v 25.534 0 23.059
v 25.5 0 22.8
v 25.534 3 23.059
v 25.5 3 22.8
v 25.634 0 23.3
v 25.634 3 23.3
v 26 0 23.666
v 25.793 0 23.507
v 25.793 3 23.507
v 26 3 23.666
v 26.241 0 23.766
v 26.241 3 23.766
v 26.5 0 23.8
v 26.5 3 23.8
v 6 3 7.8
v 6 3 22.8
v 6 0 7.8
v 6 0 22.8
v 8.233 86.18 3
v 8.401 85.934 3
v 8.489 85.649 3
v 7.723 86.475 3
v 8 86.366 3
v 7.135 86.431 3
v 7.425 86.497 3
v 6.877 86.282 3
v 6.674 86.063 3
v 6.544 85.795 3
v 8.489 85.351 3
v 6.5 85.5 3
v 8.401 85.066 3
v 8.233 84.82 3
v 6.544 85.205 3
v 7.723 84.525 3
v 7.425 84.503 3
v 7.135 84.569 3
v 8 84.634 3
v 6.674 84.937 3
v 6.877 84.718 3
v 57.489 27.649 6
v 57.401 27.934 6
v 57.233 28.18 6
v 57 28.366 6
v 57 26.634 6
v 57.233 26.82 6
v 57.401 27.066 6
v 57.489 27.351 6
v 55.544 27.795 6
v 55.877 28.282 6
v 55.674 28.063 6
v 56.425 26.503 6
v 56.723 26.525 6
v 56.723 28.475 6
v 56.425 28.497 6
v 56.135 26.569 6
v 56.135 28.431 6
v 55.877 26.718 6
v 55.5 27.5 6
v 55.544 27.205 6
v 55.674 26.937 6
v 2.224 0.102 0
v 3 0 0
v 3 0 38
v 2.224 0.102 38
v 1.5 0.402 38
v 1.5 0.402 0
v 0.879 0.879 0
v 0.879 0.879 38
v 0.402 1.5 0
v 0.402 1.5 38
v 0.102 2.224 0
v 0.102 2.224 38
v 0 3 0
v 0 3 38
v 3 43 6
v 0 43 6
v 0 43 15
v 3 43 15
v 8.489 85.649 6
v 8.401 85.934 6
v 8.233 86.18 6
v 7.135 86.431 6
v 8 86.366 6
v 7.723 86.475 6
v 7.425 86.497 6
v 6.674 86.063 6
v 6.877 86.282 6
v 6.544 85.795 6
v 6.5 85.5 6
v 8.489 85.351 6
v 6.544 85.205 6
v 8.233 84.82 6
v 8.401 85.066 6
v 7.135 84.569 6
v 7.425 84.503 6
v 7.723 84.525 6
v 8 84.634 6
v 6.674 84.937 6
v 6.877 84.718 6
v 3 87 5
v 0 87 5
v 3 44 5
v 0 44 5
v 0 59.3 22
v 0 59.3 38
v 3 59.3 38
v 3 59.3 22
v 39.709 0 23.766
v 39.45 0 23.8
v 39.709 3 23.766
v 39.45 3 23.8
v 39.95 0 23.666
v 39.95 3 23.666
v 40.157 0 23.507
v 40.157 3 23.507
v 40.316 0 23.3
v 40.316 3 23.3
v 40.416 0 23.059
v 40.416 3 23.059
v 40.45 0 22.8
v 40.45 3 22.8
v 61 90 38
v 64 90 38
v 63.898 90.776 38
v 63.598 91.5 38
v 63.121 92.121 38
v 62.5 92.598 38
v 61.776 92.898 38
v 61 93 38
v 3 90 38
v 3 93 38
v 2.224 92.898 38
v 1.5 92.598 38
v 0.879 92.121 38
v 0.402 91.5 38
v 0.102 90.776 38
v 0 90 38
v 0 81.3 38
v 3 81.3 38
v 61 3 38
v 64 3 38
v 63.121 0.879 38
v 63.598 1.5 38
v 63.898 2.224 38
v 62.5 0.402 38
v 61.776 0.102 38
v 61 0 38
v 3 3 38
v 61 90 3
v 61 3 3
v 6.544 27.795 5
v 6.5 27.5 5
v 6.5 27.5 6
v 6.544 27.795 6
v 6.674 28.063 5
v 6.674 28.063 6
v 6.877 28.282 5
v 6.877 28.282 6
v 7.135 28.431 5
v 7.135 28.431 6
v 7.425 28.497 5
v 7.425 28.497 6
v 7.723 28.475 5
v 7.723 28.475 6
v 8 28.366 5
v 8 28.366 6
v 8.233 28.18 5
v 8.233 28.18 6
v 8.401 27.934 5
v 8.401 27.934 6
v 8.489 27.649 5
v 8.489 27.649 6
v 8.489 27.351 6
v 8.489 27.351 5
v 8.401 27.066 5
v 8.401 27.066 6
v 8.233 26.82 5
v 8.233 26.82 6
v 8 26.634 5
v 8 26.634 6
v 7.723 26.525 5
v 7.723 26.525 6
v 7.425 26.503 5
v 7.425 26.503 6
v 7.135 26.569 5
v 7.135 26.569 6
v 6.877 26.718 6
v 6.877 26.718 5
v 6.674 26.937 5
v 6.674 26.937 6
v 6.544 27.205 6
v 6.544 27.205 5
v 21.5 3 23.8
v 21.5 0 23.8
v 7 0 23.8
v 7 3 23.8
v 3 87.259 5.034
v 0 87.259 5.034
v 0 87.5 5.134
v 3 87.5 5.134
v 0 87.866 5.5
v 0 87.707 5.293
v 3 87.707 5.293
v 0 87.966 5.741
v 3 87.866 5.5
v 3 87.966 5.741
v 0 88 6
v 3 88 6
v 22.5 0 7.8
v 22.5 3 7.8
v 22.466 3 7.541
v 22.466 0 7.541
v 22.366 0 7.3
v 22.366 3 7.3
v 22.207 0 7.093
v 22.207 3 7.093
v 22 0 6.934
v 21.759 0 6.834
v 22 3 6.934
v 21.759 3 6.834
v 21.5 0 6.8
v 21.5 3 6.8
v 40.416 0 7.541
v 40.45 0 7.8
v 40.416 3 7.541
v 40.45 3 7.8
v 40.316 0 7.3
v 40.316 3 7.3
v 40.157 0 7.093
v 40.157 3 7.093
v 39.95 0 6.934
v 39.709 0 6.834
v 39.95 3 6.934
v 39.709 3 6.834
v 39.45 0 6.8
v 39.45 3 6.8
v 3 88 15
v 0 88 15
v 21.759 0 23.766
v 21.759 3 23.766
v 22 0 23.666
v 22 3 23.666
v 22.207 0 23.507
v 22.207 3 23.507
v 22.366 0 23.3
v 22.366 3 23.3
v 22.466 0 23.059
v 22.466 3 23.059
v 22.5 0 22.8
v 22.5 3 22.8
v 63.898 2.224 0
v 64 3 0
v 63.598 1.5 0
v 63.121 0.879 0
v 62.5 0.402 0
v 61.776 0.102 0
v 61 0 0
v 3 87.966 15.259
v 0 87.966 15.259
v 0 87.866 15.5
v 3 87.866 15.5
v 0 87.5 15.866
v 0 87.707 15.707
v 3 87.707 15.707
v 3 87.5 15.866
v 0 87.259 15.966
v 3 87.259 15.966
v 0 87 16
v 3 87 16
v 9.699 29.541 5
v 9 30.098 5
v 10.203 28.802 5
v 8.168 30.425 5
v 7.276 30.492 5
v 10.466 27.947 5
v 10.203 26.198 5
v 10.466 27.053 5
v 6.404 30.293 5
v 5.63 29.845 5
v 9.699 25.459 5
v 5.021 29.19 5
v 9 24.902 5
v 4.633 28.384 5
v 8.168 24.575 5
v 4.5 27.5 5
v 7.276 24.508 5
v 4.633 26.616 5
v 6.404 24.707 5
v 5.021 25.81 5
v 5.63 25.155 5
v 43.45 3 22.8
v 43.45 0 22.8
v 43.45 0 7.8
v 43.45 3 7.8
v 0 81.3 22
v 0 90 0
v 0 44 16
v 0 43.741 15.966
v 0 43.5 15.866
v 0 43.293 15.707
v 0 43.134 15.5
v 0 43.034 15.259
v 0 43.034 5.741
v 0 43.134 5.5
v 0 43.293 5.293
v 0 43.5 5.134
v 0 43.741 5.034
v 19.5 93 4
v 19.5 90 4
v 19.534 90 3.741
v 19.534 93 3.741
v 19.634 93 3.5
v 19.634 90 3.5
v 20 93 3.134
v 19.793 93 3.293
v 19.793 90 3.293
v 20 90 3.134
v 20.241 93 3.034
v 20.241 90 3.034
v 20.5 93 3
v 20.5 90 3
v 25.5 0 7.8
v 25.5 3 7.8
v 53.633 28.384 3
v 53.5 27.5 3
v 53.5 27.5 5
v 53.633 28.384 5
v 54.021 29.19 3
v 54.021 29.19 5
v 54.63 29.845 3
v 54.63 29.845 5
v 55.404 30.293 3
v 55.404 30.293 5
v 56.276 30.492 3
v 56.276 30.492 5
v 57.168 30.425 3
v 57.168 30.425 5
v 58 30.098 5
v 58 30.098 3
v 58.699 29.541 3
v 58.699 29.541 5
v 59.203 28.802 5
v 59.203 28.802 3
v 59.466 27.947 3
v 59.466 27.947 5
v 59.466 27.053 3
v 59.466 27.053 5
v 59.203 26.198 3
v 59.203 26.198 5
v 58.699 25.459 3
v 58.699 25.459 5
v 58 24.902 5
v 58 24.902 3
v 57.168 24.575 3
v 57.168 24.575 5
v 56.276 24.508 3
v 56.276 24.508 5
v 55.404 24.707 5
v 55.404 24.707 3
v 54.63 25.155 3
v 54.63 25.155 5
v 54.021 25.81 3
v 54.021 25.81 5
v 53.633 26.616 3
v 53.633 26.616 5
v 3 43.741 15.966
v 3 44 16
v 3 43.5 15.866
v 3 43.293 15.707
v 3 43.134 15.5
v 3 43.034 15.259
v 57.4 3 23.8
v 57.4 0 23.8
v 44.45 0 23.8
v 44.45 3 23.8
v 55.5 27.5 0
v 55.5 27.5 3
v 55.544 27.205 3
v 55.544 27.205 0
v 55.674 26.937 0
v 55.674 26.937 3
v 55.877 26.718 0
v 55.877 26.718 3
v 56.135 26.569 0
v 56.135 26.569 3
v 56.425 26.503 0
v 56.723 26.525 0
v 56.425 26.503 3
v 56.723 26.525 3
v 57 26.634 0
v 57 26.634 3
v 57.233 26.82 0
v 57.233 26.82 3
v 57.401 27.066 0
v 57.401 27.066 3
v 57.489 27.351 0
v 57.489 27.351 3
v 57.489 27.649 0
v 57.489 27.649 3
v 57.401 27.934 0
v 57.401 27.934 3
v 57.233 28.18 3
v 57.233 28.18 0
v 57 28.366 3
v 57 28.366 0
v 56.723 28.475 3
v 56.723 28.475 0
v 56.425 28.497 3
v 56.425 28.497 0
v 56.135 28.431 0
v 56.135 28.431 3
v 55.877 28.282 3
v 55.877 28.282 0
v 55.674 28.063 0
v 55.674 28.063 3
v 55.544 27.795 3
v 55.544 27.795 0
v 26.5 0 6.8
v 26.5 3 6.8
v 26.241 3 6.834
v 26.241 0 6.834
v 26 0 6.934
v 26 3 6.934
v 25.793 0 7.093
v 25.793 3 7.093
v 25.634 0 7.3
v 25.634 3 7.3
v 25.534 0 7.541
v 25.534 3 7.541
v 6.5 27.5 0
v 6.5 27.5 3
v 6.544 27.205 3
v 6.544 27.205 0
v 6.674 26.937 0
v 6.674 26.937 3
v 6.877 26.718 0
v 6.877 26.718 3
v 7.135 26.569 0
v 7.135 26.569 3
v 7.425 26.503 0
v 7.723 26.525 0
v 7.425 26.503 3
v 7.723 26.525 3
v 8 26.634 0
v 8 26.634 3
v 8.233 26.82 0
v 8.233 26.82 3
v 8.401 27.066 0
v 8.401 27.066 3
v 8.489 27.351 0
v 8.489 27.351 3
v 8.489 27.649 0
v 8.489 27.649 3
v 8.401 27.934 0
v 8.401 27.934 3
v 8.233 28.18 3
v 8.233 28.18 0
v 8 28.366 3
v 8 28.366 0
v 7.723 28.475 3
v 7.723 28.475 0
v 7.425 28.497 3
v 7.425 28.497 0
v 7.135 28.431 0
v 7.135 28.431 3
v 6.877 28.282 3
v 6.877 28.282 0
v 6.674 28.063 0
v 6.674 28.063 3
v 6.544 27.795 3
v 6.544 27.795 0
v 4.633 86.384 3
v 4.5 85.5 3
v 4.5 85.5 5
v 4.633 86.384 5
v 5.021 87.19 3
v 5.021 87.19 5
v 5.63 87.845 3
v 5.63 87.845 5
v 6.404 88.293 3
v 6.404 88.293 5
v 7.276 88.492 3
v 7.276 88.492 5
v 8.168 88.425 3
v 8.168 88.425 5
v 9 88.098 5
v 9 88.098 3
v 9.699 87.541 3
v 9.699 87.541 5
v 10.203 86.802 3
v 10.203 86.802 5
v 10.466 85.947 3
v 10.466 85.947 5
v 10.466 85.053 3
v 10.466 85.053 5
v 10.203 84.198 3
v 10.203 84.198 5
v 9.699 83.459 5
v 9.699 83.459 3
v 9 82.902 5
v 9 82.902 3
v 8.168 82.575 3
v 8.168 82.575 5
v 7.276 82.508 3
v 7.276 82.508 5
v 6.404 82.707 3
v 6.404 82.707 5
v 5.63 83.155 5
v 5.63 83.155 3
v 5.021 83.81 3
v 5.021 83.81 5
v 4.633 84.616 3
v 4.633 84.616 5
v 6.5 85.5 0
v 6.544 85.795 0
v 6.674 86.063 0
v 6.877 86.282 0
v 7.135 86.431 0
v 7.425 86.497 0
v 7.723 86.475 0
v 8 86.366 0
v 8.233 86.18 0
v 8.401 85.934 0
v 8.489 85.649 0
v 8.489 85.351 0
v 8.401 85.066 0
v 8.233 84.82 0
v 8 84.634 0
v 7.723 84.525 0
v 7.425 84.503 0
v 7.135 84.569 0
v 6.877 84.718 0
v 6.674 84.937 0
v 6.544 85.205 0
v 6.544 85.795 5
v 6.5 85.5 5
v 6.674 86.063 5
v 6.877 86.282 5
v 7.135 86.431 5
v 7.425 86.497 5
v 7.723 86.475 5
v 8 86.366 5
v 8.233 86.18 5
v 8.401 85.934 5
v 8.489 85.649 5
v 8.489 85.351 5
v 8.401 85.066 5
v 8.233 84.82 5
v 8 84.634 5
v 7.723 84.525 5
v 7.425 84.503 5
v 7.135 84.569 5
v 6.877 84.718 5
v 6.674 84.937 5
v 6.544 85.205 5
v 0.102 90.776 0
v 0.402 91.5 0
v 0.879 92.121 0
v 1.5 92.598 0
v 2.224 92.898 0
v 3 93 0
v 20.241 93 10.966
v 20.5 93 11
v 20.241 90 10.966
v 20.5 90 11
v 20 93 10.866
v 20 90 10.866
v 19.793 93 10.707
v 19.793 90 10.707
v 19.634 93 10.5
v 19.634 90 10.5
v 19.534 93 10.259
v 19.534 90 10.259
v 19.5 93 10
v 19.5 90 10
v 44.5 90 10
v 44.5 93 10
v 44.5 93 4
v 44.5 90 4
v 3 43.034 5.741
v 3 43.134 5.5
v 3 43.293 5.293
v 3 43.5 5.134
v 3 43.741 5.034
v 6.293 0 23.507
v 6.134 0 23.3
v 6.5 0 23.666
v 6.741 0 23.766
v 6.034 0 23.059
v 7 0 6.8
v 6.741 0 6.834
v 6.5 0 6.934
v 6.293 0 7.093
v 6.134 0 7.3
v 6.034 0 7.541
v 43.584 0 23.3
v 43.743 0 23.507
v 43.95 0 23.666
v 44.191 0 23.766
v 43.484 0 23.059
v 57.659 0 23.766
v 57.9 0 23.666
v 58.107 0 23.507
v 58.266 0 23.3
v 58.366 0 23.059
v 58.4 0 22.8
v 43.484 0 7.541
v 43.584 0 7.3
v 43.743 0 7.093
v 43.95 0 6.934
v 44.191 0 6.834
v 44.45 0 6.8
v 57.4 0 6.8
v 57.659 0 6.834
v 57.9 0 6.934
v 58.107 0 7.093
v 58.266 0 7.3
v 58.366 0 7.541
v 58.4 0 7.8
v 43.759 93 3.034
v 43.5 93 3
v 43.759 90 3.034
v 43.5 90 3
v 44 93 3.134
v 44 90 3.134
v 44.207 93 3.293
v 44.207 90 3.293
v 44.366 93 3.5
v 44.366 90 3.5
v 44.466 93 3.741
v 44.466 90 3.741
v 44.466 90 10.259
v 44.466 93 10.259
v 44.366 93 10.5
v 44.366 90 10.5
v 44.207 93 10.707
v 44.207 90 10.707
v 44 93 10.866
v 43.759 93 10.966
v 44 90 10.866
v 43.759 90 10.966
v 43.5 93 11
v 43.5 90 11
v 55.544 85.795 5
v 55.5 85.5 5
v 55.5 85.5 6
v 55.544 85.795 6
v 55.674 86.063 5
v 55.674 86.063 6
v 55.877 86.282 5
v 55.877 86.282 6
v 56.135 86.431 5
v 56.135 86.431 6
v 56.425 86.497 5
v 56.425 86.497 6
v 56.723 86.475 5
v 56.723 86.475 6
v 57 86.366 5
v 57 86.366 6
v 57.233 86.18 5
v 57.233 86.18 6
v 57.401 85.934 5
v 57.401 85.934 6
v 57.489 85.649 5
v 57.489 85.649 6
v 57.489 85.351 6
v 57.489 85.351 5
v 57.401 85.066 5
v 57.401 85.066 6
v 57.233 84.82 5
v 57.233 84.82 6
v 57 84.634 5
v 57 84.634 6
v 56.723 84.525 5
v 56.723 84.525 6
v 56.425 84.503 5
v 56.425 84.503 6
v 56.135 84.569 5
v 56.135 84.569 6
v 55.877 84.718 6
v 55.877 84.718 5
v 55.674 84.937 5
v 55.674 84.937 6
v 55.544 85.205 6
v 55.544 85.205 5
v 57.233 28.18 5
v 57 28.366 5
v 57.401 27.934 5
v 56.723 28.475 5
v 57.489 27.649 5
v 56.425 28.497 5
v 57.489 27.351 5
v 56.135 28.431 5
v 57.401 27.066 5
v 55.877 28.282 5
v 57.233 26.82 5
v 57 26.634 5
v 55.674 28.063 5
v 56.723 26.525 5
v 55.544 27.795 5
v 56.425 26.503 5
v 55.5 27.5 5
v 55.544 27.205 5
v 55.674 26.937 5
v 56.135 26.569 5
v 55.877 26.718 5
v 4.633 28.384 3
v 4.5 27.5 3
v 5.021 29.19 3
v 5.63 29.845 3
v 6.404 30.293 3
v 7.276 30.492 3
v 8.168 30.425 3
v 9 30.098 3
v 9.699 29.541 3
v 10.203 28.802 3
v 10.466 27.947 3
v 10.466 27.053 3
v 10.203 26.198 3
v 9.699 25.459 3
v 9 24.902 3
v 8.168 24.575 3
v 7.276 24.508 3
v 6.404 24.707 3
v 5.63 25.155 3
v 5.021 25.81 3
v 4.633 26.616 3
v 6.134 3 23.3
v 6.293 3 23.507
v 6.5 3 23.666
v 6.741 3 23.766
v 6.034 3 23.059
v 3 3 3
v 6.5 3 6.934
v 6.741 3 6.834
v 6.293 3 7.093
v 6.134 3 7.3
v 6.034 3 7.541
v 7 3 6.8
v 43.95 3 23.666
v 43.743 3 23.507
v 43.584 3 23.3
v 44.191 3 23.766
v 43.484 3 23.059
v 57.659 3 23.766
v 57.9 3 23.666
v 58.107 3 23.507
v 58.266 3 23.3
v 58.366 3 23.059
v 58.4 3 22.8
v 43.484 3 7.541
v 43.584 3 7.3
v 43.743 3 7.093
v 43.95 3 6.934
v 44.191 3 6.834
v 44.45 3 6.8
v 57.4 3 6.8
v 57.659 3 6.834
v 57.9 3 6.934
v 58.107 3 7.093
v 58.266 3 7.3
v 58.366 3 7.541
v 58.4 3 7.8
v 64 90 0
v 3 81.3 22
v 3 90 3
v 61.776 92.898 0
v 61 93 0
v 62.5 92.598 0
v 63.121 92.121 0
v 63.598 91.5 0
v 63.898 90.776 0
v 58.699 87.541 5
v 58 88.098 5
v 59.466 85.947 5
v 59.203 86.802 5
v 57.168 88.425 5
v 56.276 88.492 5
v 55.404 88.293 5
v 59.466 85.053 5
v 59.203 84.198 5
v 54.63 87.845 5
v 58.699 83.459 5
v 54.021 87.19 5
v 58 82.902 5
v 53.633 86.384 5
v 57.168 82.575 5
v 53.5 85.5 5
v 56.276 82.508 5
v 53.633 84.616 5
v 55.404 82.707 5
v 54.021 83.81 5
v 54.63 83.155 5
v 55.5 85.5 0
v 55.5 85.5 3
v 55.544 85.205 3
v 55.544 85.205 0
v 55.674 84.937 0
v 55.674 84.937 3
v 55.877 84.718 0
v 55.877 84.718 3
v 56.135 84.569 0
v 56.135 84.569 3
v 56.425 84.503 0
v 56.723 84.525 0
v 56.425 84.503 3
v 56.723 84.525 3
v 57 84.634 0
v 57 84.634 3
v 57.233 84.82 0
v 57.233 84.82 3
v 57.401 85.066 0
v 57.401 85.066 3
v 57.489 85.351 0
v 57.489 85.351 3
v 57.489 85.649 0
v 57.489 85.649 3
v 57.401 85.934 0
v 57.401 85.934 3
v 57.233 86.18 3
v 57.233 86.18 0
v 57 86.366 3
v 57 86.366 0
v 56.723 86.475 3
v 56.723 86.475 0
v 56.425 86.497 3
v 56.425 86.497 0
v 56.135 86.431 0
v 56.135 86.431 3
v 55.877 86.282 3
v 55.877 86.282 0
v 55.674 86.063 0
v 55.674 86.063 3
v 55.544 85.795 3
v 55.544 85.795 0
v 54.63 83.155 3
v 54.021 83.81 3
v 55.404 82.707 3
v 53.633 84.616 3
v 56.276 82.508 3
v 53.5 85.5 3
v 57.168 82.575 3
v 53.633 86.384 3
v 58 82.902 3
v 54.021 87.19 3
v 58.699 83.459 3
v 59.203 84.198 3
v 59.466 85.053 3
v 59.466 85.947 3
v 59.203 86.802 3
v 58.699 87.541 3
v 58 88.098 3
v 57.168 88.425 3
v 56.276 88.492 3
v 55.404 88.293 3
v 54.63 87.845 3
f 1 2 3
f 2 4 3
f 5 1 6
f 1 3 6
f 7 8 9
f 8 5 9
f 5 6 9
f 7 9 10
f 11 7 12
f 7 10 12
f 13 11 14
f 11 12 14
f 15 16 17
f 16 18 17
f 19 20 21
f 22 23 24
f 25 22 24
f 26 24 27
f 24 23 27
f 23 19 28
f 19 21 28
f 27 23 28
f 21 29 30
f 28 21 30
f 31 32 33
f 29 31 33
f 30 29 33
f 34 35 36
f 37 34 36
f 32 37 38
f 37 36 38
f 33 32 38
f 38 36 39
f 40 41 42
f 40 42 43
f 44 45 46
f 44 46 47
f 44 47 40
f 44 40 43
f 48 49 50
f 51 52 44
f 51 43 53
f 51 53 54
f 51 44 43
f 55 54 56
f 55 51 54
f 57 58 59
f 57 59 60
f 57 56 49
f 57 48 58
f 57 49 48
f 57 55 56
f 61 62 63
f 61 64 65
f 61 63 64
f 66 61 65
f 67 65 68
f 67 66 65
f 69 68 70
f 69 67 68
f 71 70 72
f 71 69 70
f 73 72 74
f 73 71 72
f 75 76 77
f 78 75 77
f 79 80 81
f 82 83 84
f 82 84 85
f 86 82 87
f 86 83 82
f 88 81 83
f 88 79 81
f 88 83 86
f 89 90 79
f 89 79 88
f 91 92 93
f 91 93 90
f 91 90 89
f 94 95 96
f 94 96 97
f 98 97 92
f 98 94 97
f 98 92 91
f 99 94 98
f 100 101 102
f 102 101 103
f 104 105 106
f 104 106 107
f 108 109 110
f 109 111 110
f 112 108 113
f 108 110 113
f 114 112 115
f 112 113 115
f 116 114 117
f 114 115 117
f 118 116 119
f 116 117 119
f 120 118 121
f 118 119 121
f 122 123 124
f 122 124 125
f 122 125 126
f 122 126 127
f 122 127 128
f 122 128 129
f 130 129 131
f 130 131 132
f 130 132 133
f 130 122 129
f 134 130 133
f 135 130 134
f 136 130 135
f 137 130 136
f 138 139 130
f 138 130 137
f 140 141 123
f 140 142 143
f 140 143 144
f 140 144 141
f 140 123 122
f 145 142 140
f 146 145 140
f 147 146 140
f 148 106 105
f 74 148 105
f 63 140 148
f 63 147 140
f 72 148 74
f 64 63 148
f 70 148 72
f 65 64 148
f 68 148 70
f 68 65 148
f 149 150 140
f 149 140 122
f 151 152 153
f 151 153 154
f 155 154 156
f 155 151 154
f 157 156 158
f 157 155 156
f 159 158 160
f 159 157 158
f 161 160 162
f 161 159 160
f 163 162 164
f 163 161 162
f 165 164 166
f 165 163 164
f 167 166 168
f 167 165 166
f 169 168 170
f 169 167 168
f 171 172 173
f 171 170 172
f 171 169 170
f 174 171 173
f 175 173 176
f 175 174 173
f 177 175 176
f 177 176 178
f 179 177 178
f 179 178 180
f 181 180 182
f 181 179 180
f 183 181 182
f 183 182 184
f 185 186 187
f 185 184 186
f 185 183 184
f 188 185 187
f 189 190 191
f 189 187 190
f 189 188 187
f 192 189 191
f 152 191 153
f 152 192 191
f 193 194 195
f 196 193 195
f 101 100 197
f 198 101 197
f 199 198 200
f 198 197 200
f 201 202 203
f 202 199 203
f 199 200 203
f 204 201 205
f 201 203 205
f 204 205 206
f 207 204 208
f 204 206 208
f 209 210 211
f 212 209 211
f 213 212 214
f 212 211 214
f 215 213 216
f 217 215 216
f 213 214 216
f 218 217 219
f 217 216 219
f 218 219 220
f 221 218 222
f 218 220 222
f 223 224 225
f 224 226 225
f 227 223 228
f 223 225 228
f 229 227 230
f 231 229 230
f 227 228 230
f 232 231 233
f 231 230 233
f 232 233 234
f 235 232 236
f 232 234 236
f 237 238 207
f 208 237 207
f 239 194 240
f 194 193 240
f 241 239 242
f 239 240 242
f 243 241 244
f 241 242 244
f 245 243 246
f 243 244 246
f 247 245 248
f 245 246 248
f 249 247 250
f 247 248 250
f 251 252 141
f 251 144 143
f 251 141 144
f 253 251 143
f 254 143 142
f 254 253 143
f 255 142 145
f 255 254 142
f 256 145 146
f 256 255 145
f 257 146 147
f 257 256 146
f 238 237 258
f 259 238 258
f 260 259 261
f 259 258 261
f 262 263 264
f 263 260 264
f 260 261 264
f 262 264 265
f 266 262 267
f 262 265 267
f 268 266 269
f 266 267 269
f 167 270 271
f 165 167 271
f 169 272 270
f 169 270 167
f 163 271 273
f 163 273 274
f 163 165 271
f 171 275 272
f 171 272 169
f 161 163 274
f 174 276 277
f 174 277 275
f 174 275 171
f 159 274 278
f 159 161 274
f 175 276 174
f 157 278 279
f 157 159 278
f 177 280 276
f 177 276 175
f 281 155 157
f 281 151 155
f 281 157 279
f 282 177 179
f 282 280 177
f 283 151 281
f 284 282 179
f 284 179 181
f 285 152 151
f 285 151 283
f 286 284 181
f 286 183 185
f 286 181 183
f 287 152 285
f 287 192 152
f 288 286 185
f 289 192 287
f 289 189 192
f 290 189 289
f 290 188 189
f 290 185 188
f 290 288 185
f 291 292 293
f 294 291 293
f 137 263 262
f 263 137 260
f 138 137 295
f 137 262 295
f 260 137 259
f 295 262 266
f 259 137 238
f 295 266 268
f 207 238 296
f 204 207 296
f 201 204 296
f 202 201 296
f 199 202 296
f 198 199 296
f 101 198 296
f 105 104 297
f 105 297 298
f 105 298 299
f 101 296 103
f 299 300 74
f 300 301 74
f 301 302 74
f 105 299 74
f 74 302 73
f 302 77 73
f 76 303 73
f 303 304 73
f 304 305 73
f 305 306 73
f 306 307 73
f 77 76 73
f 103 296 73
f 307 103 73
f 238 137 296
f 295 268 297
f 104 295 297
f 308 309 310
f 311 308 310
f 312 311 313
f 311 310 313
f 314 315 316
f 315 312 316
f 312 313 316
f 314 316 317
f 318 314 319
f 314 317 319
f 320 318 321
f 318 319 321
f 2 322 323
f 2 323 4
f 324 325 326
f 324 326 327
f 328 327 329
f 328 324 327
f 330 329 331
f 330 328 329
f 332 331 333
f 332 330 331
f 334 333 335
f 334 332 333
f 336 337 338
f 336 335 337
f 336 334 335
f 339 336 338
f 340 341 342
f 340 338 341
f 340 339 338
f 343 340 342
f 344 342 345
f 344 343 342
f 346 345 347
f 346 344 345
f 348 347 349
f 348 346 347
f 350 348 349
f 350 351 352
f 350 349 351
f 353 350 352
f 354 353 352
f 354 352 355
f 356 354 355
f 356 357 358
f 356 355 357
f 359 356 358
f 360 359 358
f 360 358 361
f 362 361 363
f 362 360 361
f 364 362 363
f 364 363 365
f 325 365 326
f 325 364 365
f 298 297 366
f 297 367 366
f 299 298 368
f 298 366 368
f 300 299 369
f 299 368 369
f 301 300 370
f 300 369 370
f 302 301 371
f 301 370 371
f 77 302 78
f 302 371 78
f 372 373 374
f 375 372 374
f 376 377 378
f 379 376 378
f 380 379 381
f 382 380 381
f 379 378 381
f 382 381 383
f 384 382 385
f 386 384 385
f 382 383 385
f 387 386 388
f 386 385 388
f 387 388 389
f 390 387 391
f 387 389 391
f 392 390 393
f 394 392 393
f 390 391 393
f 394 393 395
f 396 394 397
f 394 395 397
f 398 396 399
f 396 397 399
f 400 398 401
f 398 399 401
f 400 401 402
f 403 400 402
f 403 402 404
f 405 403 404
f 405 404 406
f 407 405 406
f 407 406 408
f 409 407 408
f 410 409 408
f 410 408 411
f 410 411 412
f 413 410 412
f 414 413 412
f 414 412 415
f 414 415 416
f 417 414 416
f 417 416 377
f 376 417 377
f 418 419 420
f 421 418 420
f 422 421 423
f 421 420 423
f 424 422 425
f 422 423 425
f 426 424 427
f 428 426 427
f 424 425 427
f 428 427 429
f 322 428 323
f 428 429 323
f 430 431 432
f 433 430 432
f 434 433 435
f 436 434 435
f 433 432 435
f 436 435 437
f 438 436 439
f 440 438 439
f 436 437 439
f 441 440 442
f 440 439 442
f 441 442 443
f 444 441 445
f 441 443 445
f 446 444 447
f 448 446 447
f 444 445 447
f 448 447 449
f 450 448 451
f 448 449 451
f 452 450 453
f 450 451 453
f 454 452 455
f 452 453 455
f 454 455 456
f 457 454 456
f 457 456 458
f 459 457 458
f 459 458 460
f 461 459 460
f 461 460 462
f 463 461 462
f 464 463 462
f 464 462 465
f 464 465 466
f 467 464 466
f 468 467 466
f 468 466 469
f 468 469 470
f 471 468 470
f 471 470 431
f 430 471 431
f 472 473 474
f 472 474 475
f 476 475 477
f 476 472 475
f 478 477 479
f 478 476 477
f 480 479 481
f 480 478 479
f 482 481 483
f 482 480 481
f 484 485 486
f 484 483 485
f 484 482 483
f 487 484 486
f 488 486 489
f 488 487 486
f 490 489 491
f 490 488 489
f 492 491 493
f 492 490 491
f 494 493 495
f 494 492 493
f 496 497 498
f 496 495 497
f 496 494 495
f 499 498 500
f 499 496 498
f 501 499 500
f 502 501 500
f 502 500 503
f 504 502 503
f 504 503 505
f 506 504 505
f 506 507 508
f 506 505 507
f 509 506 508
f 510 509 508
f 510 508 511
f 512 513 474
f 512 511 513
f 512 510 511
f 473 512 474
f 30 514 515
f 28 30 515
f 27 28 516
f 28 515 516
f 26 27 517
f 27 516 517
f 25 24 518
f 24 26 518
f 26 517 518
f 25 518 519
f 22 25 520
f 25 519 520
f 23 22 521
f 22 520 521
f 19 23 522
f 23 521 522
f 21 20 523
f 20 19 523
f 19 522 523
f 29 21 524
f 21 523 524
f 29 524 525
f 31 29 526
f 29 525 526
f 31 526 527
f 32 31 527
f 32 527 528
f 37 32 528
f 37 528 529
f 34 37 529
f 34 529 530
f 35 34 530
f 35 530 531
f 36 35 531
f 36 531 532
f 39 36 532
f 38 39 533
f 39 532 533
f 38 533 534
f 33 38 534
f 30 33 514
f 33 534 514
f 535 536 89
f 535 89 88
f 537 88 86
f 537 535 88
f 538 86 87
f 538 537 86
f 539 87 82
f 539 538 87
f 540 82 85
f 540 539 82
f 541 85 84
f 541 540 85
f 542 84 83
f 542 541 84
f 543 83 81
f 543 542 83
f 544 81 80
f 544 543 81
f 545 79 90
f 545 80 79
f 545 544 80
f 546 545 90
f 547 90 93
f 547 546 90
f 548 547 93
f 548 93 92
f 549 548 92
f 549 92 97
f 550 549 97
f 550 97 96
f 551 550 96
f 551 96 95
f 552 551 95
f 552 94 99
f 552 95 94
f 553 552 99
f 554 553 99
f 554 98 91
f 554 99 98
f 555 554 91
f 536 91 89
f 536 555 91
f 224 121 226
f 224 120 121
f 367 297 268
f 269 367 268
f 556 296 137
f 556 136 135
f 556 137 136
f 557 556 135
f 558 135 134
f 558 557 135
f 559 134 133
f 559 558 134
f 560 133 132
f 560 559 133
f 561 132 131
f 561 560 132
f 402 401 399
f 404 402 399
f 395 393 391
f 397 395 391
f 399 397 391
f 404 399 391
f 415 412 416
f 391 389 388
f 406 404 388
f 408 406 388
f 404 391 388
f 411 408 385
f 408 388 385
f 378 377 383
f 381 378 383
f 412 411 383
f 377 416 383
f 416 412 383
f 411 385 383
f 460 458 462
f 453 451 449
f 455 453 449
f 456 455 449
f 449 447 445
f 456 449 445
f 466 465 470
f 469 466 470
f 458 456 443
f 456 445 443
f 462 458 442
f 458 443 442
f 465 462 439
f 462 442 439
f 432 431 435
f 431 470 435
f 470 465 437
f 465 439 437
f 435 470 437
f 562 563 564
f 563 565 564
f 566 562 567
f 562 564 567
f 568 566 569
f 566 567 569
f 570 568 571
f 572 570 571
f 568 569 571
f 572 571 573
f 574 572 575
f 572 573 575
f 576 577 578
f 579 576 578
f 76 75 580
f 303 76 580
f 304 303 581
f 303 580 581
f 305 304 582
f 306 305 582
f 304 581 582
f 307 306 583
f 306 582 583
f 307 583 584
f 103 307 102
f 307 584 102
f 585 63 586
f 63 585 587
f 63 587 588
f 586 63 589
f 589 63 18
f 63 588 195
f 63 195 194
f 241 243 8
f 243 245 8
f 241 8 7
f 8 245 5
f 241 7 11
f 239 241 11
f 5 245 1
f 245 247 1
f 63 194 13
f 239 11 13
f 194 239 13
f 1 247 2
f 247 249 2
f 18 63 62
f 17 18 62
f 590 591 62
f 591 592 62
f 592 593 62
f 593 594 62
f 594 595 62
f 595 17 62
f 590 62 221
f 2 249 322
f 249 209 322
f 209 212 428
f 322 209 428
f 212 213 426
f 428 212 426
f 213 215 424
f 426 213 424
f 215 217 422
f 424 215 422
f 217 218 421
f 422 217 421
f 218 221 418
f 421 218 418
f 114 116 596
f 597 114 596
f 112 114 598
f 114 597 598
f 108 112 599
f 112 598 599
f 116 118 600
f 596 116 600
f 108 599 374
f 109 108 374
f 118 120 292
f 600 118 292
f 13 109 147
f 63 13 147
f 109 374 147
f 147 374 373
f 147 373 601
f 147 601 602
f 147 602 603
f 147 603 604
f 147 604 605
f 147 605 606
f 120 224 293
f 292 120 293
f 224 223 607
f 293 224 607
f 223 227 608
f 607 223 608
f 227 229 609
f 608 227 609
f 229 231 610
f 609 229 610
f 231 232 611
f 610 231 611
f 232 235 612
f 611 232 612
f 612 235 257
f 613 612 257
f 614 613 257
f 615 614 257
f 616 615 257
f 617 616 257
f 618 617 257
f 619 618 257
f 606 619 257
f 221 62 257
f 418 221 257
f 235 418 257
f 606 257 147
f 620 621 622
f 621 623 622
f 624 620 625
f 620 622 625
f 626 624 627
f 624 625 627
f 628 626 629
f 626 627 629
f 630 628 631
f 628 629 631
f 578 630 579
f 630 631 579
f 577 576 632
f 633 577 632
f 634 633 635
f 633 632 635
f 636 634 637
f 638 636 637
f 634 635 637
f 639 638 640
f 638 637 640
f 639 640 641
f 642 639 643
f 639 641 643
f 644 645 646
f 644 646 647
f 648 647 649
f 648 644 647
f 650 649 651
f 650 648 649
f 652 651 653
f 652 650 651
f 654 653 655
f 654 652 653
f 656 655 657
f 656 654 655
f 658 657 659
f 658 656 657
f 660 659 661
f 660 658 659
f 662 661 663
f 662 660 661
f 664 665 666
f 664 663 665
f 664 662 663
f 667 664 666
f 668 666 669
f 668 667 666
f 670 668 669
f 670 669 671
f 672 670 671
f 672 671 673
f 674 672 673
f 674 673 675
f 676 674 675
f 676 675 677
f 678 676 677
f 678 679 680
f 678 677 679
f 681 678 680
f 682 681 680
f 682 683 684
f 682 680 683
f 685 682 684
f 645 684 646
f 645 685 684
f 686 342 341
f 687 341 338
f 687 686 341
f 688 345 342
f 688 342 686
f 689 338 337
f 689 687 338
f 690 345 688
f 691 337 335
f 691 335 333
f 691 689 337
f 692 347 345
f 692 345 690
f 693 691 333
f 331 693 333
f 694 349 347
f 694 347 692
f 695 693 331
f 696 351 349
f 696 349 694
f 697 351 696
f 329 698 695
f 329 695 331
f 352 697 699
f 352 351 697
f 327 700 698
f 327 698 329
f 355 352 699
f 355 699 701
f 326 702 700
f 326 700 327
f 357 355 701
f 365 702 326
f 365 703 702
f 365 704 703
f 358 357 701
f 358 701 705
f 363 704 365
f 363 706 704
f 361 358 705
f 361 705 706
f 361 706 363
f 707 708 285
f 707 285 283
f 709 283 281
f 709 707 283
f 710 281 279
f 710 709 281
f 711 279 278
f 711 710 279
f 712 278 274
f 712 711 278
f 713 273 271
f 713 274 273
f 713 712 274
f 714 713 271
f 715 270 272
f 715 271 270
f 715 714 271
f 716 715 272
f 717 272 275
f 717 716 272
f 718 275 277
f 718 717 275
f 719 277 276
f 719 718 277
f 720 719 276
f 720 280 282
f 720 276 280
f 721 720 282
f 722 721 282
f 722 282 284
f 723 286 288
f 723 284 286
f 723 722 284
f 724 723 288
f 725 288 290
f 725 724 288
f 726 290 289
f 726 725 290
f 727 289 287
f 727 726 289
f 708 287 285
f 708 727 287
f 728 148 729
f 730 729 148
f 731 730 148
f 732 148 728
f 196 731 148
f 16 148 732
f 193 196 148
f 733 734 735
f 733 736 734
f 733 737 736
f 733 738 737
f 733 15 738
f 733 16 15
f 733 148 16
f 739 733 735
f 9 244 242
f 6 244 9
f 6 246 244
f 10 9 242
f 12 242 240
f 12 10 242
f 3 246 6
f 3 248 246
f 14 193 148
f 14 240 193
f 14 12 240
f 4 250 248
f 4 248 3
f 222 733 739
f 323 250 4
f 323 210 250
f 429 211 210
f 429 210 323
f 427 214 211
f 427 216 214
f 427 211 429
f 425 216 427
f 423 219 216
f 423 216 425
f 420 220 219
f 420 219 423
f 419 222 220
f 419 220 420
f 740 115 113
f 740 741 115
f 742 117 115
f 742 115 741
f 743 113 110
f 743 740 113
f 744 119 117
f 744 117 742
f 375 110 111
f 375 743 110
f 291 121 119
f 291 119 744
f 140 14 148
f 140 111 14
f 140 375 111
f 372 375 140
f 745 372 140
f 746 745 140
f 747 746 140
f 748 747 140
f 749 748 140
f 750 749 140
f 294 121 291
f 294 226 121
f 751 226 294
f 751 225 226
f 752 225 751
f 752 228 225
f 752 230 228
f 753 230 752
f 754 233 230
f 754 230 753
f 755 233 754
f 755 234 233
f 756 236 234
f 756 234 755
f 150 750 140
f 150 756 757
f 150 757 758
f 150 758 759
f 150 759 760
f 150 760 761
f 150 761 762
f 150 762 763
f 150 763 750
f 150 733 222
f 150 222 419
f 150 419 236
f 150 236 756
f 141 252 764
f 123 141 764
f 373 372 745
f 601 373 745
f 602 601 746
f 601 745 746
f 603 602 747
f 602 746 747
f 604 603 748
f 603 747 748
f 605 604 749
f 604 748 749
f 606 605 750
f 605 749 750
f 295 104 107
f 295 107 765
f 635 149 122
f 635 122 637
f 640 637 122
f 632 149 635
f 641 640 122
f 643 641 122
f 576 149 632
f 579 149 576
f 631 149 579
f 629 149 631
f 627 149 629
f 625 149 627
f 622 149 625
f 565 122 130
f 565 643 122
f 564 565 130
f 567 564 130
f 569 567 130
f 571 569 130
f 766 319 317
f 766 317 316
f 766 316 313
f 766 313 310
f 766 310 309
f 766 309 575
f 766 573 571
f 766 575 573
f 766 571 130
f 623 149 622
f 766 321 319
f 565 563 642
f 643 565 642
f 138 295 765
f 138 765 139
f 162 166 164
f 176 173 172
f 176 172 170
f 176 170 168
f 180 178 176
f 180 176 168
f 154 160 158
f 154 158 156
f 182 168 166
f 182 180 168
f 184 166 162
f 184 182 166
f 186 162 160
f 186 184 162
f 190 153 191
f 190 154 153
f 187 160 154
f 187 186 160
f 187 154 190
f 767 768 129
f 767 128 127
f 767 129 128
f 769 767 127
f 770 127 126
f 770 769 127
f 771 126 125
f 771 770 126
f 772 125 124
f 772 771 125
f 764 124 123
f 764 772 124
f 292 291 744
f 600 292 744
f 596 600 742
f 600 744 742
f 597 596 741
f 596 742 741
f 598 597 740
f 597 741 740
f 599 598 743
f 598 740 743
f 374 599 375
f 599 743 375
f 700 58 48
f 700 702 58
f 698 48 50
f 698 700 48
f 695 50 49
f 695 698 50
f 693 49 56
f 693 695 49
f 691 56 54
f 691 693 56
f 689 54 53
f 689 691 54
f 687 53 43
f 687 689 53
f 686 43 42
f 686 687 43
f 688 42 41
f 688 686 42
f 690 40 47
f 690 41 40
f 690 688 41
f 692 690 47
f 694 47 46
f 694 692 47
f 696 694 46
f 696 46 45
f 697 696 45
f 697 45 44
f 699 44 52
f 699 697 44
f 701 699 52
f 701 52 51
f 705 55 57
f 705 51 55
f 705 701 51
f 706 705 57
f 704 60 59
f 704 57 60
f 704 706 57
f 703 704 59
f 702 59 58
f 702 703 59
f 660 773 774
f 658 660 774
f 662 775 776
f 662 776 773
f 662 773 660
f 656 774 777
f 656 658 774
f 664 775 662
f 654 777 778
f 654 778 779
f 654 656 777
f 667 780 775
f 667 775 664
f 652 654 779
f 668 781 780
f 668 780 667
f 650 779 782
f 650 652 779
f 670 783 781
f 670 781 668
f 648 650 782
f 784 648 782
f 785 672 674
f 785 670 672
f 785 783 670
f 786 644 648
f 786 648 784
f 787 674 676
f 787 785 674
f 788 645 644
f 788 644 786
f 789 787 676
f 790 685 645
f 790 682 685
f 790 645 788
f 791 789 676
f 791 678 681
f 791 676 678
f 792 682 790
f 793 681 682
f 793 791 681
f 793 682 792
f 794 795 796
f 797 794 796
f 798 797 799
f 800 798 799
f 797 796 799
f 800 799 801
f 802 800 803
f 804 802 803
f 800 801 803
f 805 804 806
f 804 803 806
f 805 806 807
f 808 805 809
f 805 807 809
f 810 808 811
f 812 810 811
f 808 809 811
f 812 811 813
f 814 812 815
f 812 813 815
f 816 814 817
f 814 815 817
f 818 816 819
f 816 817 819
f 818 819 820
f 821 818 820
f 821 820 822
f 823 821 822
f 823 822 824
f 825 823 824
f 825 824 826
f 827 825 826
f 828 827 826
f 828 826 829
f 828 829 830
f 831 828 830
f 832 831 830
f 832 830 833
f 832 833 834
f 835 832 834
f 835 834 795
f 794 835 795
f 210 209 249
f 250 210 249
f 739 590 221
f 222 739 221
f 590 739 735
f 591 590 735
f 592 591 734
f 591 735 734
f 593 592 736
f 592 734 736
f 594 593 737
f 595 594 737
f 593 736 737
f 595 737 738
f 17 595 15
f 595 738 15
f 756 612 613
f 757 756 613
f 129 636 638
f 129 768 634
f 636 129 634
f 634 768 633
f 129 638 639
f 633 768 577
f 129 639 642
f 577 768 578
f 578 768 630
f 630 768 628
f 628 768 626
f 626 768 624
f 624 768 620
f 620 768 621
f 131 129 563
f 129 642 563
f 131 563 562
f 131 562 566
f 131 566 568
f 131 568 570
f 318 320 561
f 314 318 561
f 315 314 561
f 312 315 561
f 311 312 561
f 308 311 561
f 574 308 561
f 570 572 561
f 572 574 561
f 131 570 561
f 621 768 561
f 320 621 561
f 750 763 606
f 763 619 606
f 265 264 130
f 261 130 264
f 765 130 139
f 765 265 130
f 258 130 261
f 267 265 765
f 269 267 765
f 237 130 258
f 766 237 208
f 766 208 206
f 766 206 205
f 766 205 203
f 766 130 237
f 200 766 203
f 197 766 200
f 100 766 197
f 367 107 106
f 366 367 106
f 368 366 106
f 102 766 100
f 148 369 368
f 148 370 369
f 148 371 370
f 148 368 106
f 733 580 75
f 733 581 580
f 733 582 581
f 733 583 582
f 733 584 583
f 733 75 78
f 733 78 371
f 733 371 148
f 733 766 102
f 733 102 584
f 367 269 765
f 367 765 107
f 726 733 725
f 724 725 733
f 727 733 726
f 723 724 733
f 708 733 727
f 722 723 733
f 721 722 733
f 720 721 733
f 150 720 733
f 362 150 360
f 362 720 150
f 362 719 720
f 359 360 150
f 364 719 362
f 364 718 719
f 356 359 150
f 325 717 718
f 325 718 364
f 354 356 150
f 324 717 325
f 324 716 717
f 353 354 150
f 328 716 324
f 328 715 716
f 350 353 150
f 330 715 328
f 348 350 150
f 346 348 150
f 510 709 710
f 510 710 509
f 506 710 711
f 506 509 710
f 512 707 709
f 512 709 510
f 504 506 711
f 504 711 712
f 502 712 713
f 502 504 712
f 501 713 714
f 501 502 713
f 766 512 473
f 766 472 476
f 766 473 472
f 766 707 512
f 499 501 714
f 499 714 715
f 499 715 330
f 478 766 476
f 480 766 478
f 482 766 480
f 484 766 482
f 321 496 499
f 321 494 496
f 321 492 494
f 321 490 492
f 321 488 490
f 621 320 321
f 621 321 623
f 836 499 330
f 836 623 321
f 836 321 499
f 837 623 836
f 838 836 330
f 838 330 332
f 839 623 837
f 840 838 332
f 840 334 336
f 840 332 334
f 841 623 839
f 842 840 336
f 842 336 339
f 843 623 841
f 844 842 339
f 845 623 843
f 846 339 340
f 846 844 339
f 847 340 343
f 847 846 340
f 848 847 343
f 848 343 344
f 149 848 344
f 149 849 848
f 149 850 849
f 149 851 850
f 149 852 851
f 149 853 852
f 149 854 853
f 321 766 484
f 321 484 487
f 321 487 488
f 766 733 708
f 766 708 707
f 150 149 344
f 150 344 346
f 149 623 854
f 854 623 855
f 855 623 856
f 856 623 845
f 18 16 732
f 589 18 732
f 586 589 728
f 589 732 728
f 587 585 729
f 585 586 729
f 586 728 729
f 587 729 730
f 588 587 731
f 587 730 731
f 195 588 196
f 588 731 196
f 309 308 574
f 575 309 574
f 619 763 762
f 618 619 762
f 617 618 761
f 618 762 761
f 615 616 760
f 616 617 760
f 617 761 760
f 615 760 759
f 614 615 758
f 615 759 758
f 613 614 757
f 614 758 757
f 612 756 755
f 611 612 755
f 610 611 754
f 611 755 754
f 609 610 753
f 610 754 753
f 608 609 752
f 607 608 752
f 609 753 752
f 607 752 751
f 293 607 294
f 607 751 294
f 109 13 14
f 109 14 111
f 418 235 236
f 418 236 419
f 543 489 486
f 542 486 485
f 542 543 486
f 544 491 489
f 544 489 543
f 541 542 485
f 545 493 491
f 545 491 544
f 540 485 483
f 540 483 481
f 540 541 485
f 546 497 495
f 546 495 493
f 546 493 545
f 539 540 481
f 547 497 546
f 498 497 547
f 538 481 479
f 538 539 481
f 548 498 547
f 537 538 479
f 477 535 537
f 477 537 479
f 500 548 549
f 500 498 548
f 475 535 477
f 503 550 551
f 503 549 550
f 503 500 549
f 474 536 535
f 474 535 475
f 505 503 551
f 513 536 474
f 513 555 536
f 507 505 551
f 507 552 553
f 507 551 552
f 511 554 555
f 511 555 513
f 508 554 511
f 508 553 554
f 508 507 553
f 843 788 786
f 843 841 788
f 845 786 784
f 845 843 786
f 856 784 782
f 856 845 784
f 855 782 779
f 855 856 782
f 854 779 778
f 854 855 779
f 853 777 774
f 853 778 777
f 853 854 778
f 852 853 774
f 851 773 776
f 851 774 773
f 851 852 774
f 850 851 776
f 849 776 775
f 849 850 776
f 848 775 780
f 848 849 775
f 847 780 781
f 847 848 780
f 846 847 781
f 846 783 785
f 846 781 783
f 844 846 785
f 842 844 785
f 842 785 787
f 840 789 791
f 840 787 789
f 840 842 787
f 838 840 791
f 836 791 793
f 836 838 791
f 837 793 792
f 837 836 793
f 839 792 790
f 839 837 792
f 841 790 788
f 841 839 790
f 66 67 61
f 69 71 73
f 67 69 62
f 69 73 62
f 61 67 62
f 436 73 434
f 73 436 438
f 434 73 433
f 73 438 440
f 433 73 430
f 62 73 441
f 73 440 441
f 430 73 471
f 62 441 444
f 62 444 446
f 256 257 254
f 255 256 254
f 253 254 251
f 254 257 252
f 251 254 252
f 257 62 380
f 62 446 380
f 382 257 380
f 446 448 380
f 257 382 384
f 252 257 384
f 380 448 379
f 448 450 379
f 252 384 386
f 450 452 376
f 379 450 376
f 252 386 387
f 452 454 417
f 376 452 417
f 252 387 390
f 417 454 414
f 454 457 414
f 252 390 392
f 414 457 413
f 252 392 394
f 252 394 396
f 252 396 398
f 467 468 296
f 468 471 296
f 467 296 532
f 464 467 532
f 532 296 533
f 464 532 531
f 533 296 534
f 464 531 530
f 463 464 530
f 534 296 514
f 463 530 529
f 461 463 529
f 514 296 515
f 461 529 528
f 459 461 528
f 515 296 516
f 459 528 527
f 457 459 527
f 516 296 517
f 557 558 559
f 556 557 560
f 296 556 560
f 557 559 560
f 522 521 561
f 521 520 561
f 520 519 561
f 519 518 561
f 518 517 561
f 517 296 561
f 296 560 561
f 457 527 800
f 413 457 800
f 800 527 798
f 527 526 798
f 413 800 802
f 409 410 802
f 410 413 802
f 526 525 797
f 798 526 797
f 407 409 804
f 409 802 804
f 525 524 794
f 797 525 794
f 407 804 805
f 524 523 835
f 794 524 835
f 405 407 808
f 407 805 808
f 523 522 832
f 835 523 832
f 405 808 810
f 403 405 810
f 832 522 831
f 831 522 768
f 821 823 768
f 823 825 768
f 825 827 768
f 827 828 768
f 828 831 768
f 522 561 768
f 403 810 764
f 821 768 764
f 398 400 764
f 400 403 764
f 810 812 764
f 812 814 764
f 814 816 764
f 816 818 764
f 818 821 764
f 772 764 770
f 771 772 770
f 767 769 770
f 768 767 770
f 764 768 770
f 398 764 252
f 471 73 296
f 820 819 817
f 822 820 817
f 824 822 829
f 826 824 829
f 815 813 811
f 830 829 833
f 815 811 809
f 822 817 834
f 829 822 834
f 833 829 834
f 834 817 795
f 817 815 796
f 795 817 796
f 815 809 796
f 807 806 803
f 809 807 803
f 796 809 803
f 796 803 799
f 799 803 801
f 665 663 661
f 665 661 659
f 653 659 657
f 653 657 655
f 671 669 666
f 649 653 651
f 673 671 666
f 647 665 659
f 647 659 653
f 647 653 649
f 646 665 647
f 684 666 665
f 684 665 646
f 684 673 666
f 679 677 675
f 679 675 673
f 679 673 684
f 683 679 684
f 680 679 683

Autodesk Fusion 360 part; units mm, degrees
sketch "Sketch1" plane through (0, 0, 0) normal (0, 0, 1) x (1, 0, 0)
  line L0 (3, 0) -> (61, 0)
  line L1 (64, 3) -> (64, 90)
  line L2 (61, 93) -> (3, 93)
  line L3 (0, 90) -> (0, 3)
  arc A0 (3, 93) -> (0, 90) centre (3, 90) ccw
  arc A1 (64, 90) -> (61, 93) centre (61, 90) ccw
  arc A2 (61, 0) -> (64, 3) centre (61, 3) ccw
  arc A3 (0, 3) -> (3, 0) centre (3, 3) ccw
  point P0 (64, 0)
  point P1 (0, 93)
  dimension "d1" = 64
  dimension "d2" = 93
  dimension "d3" = 3
  dimension "d4" = 3
extrude "Extrude1" add sketch "Sketch1" along normal blind 3
sketch "Sketch4" plane through (0, 0, 3) normal (0, 0, 1) x (-1, 0, 0)
  arc A0 (0, -3) -> (-3, 0) centre (-3, -3) ccw
  line L0 (-3, 0) -> (-61, 0)
  arc A1 (-61, 0) -> (-64, -3) centre (-61, -3) ccw
  line L1 (-64, -3) -> (-64, -90)
  arc A2 (-64, -90) -> (-61, -93) centre (-61, -90) ccw
  line L2 (-61, -93) -> (-3, -93)
  arc A3 (-3, -93) -> (0, -90) centre (-3, -90) ccw
  line L3 (0, -90) -> (0, -3)
  line L4 (-3, -3) -> (-61, -3)
  line L5 (-61, -3) -> (-61, -90)
  line L6 (-61, -90) -> (-3, -90)
  line L7 (-3, -90) -> (-3, -3)
  dimension "d11" = 58
  dimension "d12" = 87
  dimension "d13" = 3
  dimension "d14" = 3
extrude "Extrude2" add sketch "Sketch4" along normal blind 35
sketch "Sketch5" plane through (0, 0, 0) normal (0, -1, 0) x (1, 0, 0)
  line L0 (3, 0) -> (61, 0)
  line L1 (61, 0) -> (61, 23)
  line L2 (3, 23) -> (61, 23)
  line L3 (6, 6.8) -> (22.5, 6.8)
  line L4 (22.5, 6.8) -> (22.5, 23.8)
  line L5 (22.5, 23.8) -> (6, 23.8)
  line L6 (6, 23.8) -> (6, 6.8)
  line L7 (3, 0) -> (3, 23)
  line L8 (25.5, 23.8) -> (40.45, 23.8)
  line L9 (40.45, 23.8) -> (40.45, 6.8)
  line L10 (40.45, 6.8) -> (25.5, 6.8)
  line L11 (25.5, 6.8) -> (25.5, 23.8)
  line L12 (43.45, 6.8) -> (58.4, 6.8)
  line L13 (58.4, 6.8) -> (58.4, 23.8)
  line L14 (58.4, 23.8) -> (43.45, 23.8)
  line L15 (43.45, 23.8) -> (43.45, 6.8)
  line L16 (3, 0) -> (61, 0)
  line L17 (61, 0) -> (61, 38)
  line L18 (61, 38) -> (3, 38)
  line L19 (3, 38) -> (3, 0)
  dimension "d21" = 16.5
  dimension "d22" = 17
  dimension "d23" = 3
  dimension "d26" = 14.95
  dimension "d27" = 17
  dimension "d29" = 14.95
  dimension "d30" = 17
  dimension "d31" = 3
  dimension "d34" = 3
  dimension "d45" = 6.8
extrude "Extrude4" cut sketch "Sketch5" against normal blind 3 contours L2 L4 L5 L6 | L2 L3 L4 L6 | L2 L12 L13 L15 | L2 L13 L14 L15 | L2 L8 L9 L11 | L2 L9 L10 L11
sketch "Sketch6" plane through (0, 0, 3) normal (0, 0, 1) x (-1, 0, 0)
  line L0 (-3, -3) -> (-61, -3)
  line L1 (-61, -3) -> (-61, -90)
  line L2 (-61, -90) -> (-3, -90)
  line L3 (-3, -90) -> (-3, -3)
  circle A0 centre (-7.5, -85.5) radius 1
  circle A1 centre (-7.5, -85.5) radius 3
  circle A2 centre (-56.5, -85.5) radius 1
  circle A3 centre (-56.5, -85.5) radius 3
  circle A4 centre (-56.5, -27.5) radius 1
  circle A5 centre (-56.5, -27.5) radius 3
  circle A6 centre (-7.5, -27.5) radius 1
  circle A7 centre (-7.5, -27.5) radius 3
  dimension "d35" = 2
  dimension "d36" = 4.5
  dimension "d37" = 4.5
  dimension "d38" = 6
  dimension "d59" = 2
  dimension "d60" = 4.5
  dimension "d61" = 4.5
  dimension "d62" = 6
  dimension "d63" = 2
  dimension "d64" = 4.5
  dimension "d65" = 58
  dimension "d66" = 6
  dimension "d67" = 2
  dimension "d68" = 4.5
  dimension "d69" = 58
  dimension "d70" = 6
extrude "Extrude6" cut sketch "Sketch6" against normal blind 3 contours A0 | A2 | A4 | A6
extrude "Extrude7" add sketch "Sketch6" along normal blind 0.5 contours A1
sketch "Sketch7" plane through (0, 0, 0) normal (-1, 0, 0) x (0, -1, 0)
  line L0 (-90, 0) -> (-3, 0)
  line L1 (-3, 0) -> (-3, 38)
  line L2 (-3, 38) -> (-90, 38)
  line L3 (-90, 38) -> (-90, 0)
  line L4 (-88, 5) -> (-43, 5)
  line L5 (-43, 5) -> (-43, 16)
  line L6 (-43, 16) -> (-88, 16)
  line L7 (-88, 16) -> (-88, 5)
  dimension "d46" = 45
  dimension "d47" = 11
  dimension "d50" = 5
extrude "Extrude8" cut sketch "Sketch7" against normal blind 3 contours L4 L5 L6 L7
sketch "Sketch8" plane through (0, 93, 0) normal (0, 1, 0) x (-1, 0, 0)
  line L0 (-61, 0) -> (-3, 0)
  line L1 (-3, 0) -> (-3, 38)
  line L2 (-3, 38) -> (-61, 38)
  line L3 (-61, 38) -> (-61, 0)
  line L4 (-44.5, 3) -> (-19.5, 3)
  line L5 (-19.5, 3) -> (-19.5, 11)
  line L6 (-19.5, 11) -> (-44.5, 11)
  line L7 (-44.5, 11) -> (-44.5, 3)
  line L8 (-3, 0) -> (-3, 23)
  line L9 (-3, 0) -> (-61, 0)
  dimension "d51" = 25
  dimension "d52" = 8
  dimension "d53" = 16.5
  dimension "d54" = 3
extrude "Extrude9" cut sketch "Sketch8" against normal blind 3 contours L4 L5 L6 L7
extrude "Extrude10" add 1 faces at (9.6751, 86.3269, 3.5) along direction (0, 0, 1) blind 1.5
extrude "Extrude11" add sketch "Sketch6" along normal blind 2 contours A3 | A5 | A7
extrude "Extrude13" add sketch "Sketch6" along normal blind 3 contours A4
extrude "Extrude14" add sketch "Sketch6" along normal blind 3 contours A0 | A2 | A6
sketch "Sketch11" plane through (0, 0, 0) normal (-1, 0, 0) x (0, -1, 0)
  line L0 (-43, 5) -> (-88, 5)
  line L1 (-88, 5) -> (-88, 16)
  line L2 (-88, 16) -> (-43, 16)
  line L3 (-43, 16) -> (-43, 5)
  line L4 (-90, 0) -> (-3, 0)
  line L5 (-3, 0) -> (-3, 38)
  line L6 (-3, 38) -> (-90, 38)
  line L7 (-90, 38) -> (-90, 0)
  line L8 (-81.3, 38) -> (-59.3, 38)
  line L9 (-59.3, 38) -> (-59.3, 22)
  line L10 (-59.3, 22) -> (-81.3, 22)
  line L11 (-81.3, 22) -> (-81.3, 38)
  dimension "d85" = 22
  dimension "d86" = 16
  dimension "d87" = 8.7
extrude "Extrude15" cut sketch "Sketch11" against normal blind 3 contours L6 L8 L9 L10 L11
fillet "Fillet1" radius 1 1 edges at (1.5, 81.3, 22)
fillet "Fillet2" radius 1 21 edges at (1.5, 59.3, 22) (44.5, 91.5, 3) (44.5, 91.5, 11) (19.5, 91.5, 3) (19.5, 91.5, 11) (1.5, 43, 5) (6, 1.5, 6.8) (25.5, 1.5, 6.8) (43.45, 1.5, 6.8) (6, 1.5, 23.8) (25.5, 1.5, 23.8) (43.45, 1.5, 23.8) (40.45, 1.5, 23.8) (22.5, 1.5, 23.8) (58.4, 1.5, 23.8) (1.5, 88, 16) (1.5, 88, 5) (22.5, 1.5, 6.8) (40.45, 1.5, 6.8) (58.4, 1.5, 6.8) (1.5, 43, 16)
delete_face "DeleteFace1" 1 faces at (1, 80.5358, 22.0282)
delete_face "DeleteFace2" 1 faces at (1, 59.8, 22.134)
